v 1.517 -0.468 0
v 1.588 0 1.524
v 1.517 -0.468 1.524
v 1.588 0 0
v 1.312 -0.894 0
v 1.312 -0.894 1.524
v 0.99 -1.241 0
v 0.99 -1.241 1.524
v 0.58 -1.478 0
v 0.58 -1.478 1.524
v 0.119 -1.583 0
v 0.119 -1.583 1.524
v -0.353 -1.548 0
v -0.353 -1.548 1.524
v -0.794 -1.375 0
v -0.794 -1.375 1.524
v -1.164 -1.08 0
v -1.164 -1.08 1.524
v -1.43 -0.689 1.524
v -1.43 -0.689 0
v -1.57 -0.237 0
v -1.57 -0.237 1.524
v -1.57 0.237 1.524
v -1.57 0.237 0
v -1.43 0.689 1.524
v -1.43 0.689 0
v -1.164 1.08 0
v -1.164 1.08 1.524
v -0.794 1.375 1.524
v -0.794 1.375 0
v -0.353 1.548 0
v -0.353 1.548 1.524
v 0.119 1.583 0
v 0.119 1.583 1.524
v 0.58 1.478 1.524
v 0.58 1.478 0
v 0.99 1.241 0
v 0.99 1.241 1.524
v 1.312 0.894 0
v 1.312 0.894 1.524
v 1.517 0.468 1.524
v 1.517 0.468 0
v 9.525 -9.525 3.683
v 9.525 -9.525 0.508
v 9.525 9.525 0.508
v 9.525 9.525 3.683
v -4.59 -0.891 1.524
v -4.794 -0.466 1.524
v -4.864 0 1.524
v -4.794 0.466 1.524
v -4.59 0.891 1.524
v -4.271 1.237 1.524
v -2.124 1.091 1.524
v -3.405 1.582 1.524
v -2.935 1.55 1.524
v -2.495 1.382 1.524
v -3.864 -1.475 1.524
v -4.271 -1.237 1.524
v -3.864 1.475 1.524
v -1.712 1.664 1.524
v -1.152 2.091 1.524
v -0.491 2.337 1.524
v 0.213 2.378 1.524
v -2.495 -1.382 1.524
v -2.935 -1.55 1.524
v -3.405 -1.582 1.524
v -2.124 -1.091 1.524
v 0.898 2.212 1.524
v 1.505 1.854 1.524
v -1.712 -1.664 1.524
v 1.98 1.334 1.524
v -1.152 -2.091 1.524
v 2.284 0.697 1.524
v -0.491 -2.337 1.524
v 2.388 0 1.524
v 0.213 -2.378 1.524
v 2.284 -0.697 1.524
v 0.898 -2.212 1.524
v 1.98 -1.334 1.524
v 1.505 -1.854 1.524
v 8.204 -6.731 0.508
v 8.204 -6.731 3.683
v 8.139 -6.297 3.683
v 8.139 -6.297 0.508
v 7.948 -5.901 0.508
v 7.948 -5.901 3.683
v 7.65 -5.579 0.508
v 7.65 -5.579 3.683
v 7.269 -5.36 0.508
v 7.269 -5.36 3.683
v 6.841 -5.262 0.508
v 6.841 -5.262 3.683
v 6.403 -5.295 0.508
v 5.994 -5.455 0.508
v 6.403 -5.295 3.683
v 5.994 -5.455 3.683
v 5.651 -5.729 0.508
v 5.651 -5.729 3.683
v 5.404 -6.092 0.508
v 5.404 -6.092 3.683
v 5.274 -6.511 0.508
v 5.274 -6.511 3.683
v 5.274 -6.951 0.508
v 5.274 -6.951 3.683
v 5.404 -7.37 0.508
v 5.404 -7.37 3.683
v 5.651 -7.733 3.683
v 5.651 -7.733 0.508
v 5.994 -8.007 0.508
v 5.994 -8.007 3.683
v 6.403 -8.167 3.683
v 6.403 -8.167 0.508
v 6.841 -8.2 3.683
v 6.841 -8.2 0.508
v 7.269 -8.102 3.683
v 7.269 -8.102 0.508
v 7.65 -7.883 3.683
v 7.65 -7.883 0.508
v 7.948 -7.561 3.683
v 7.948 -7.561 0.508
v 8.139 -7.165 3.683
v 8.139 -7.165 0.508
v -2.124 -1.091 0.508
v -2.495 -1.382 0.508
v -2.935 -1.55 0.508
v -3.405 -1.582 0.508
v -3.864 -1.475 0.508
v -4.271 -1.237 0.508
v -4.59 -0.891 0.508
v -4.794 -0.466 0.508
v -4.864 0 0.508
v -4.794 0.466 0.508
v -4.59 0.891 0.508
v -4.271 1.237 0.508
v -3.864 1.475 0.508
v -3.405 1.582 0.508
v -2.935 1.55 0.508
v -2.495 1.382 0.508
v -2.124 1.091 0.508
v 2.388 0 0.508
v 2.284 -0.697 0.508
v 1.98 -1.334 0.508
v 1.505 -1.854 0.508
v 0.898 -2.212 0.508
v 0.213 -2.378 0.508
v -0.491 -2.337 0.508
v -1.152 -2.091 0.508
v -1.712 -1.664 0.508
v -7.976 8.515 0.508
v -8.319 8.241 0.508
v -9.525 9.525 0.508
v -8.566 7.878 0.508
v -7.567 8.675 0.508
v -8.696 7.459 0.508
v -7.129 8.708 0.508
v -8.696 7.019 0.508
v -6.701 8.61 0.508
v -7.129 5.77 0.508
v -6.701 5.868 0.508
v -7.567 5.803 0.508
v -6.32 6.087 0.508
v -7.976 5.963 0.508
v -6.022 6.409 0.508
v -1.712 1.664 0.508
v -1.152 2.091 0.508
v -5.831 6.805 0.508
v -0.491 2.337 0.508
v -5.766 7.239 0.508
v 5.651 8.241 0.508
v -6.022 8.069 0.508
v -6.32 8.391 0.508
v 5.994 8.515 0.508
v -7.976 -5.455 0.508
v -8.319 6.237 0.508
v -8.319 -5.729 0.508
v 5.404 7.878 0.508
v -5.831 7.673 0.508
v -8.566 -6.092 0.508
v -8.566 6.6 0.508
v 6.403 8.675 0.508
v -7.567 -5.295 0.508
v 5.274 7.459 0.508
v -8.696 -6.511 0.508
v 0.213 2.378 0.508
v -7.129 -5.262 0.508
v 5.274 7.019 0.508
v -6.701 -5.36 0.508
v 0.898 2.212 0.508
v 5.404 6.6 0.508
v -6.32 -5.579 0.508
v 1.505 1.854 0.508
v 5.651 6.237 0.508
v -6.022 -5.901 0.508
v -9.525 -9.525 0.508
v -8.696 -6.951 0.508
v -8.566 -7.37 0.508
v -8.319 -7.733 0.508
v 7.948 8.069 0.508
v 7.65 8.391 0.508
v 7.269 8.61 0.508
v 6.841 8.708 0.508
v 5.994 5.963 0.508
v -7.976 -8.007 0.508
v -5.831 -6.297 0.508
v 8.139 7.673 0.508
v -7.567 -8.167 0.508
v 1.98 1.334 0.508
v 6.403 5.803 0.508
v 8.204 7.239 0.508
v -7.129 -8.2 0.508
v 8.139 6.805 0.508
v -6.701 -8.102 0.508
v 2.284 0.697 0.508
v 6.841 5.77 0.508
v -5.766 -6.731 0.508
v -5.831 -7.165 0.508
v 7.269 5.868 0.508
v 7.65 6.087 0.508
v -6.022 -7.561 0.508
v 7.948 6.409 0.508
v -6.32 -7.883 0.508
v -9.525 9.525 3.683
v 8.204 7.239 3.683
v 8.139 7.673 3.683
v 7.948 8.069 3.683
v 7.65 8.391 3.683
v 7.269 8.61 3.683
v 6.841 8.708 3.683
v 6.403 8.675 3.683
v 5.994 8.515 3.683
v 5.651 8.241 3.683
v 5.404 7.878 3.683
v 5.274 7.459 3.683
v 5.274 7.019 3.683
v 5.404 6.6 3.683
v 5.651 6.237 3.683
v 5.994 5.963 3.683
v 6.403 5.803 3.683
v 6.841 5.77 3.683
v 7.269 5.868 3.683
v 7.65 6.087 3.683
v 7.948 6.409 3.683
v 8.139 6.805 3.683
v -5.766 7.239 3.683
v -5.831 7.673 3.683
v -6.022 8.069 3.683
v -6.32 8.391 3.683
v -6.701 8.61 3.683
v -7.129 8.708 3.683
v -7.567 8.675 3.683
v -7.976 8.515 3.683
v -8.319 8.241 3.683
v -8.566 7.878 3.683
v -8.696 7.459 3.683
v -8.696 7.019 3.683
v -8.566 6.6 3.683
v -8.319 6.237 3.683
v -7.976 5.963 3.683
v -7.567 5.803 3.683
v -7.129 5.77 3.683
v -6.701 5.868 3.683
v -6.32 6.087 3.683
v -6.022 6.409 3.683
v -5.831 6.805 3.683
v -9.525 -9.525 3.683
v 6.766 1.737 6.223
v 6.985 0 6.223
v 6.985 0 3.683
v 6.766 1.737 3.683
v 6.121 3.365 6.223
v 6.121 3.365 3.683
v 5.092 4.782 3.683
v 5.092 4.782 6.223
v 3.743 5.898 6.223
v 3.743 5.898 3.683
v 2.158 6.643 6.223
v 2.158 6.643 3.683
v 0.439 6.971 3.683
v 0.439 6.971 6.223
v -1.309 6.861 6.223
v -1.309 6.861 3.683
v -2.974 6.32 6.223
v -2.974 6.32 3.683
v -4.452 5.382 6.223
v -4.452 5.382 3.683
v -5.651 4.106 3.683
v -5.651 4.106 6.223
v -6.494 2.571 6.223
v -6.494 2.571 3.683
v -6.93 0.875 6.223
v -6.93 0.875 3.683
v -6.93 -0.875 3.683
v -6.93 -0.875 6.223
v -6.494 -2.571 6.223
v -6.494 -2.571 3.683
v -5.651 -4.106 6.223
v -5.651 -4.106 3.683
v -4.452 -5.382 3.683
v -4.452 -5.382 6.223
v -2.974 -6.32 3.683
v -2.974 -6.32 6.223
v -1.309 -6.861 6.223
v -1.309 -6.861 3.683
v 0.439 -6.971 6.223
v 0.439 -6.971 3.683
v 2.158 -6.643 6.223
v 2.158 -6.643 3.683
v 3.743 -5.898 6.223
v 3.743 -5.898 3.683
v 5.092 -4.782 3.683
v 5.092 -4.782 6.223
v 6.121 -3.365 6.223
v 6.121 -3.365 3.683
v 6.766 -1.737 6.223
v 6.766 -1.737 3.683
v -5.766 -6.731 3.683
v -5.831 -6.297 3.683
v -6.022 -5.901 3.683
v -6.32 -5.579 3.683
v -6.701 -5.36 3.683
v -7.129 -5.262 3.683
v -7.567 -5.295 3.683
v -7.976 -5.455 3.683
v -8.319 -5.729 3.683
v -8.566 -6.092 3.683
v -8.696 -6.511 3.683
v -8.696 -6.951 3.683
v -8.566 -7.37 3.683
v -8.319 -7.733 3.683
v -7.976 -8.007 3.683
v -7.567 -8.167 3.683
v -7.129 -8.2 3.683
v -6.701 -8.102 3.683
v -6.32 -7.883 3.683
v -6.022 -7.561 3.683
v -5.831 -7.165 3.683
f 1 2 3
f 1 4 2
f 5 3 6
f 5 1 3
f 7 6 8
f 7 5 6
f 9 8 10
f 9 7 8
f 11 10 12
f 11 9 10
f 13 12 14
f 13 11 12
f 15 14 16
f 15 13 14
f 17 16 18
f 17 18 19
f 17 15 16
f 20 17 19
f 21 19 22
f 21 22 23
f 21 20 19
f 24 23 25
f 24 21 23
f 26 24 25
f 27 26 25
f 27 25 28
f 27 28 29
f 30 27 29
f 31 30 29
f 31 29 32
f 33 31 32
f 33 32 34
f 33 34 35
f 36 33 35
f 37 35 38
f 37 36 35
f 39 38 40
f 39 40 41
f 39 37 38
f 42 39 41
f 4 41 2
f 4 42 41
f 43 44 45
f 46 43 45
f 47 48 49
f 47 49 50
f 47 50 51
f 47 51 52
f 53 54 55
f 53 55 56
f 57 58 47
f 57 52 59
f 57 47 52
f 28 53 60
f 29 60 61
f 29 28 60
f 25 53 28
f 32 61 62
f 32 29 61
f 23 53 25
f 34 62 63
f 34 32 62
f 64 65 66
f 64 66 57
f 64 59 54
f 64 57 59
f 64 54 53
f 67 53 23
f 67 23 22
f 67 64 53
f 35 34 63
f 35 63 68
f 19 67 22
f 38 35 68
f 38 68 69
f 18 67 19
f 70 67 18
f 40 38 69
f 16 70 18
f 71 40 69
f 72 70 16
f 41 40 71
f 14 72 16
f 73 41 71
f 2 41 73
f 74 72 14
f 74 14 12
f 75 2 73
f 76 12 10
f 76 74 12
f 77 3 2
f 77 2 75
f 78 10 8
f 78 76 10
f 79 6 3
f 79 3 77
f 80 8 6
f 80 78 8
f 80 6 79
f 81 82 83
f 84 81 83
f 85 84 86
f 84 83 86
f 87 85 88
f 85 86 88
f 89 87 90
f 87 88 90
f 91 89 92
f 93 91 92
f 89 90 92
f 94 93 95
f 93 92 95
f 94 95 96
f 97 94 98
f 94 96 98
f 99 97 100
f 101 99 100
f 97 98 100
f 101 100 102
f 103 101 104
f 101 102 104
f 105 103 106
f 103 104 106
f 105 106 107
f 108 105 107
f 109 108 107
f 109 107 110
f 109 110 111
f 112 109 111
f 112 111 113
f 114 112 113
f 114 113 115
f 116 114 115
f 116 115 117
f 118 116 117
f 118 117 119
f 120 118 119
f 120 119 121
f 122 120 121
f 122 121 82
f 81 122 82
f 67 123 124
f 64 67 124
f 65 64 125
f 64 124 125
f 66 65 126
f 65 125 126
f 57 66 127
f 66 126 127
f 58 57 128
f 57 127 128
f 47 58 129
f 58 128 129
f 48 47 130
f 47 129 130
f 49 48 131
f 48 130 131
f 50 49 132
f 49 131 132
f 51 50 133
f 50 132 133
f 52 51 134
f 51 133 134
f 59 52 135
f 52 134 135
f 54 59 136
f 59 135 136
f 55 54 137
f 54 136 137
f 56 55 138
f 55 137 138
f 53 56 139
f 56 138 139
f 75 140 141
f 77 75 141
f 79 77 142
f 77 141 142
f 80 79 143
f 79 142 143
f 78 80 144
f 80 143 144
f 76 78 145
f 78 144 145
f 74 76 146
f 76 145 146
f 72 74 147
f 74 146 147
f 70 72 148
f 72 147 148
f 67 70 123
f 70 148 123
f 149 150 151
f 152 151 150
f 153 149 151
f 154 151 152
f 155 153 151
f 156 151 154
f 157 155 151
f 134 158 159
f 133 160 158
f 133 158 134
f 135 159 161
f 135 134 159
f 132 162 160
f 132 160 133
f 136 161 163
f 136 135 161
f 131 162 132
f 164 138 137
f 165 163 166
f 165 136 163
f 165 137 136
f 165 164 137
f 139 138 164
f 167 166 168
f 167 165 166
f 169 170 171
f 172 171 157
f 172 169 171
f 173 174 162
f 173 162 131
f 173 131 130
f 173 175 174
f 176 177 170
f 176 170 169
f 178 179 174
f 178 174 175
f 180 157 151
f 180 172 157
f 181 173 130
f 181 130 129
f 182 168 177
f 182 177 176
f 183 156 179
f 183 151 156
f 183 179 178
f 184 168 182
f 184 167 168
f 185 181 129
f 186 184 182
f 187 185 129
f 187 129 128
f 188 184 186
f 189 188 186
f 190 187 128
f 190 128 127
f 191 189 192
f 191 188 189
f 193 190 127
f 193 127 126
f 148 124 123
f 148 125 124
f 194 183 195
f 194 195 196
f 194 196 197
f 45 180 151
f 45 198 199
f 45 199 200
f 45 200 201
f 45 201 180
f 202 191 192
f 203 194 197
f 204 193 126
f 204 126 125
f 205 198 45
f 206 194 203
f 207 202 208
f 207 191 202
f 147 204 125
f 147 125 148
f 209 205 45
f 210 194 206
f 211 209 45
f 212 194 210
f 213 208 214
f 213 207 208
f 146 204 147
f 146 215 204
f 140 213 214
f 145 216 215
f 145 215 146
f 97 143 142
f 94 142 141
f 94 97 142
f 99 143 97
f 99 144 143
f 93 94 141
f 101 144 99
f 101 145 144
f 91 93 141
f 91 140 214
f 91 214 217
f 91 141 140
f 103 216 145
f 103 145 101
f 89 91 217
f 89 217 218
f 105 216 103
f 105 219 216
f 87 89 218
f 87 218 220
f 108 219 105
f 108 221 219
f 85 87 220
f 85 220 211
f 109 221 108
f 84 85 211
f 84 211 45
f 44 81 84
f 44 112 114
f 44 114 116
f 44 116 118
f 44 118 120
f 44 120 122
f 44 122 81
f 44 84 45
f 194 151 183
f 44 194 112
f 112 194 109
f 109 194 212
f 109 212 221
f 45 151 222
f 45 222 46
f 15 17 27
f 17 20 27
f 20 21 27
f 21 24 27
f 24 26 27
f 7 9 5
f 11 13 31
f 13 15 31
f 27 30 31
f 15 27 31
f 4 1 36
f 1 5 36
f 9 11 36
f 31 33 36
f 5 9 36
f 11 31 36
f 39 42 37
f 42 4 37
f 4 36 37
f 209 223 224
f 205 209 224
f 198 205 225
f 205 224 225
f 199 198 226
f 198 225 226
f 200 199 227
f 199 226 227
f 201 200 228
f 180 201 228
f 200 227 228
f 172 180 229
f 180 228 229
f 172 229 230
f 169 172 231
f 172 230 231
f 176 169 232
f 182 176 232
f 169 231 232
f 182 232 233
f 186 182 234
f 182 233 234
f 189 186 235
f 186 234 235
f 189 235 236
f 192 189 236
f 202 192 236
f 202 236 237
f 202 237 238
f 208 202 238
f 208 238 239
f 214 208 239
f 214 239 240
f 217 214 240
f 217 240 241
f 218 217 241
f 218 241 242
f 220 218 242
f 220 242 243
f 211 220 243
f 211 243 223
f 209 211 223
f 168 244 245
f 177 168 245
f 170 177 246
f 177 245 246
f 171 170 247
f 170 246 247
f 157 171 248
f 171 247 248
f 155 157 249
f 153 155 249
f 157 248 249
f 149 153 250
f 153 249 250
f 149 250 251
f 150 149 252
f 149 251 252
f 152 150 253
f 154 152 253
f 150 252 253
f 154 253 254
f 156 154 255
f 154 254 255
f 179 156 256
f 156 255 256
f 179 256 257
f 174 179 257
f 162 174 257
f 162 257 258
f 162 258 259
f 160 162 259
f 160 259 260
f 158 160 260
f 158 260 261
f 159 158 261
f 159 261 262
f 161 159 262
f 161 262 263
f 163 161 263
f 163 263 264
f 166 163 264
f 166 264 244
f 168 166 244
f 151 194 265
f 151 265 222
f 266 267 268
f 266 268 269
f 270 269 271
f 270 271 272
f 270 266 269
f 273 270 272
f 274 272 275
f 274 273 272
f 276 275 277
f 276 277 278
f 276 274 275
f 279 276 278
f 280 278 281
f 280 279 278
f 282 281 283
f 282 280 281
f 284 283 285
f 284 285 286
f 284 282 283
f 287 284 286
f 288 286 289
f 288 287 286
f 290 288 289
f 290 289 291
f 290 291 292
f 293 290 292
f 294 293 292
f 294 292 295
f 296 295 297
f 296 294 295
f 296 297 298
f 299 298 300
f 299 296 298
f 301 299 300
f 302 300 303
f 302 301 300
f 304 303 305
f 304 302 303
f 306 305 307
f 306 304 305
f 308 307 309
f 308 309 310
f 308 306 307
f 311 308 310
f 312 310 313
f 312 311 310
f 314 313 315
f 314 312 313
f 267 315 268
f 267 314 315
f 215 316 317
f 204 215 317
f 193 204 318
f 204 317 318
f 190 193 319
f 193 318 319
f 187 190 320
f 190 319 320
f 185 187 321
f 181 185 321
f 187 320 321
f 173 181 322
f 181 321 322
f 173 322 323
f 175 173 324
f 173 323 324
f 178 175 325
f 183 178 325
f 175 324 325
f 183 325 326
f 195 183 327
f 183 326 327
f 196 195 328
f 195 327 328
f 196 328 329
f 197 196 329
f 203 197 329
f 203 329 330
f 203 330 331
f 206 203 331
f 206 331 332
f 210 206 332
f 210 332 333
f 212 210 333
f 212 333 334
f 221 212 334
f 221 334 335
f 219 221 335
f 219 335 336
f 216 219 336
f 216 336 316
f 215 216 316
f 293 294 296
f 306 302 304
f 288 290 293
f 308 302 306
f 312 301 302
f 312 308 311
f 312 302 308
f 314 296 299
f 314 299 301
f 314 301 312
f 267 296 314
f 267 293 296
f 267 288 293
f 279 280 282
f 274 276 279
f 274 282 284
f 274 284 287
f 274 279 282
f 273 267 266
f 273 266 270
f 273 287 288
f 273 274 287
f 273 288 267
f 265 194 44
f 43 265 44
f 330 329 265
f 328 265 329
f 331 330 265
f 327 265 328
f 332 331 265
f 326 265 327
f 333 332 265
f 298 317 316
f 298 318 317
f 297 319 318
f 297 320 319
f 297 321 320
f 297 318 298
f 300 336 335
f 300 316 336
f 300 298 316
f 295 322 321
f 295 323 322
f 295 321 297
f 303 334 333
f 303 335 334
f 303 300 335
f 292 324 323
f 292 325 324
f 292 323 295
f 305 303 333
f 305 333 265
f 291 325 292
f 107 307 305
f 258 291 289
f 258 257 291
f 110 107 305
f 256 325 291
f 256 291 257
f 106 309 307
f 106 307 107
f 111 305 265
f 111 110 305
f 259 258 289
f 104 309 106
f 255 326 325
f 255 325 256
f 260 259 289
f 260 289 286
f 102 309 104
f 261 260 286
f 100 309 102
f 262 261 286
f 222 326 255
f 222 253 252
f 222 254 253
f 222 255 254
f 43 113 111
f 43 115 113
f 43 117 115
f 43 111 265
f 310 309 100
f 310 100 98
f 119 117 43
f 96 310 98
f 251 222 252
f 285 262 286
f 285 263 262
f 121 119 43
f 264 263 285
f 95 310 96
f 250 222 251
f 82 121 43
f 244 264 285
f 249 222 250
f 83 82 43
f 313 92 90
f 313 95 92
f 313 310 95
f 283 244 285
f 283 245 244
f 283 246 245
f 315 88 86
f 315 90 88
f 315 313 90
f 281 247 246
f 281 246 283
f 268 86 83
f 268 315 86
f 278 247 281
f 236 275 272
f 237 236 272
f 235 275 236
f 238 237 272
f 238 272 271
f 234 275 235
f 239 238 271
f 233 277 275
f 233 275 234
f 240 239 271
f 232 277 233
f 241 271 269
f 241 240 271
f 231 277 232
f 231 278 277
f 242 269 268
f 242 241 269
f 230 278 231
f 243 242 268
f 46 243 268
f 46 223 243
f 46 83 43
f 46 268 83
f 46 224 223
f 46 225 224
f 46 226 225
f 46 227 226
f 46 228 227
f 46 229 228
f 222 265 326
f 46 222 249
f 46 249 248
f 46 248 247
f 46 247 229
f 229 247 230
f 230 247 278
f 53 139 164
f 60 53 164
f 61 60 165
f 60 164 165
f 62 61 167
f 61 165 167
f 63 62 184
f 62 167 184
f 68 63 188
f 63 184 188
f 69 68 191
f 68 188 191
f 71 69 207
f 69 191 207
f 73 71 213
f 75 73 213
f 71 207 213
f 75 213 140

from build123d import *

# Parameters (mm, degrees)
F0_W     = 19.05
F0_H     = 19.05
F1_DEPTH = 6.223
F2_W     = 19.05
F2_H     = 19.05
F2_R     = 6.985
F3_DEPTH = 2.54
F4_R     = 1.4732
F5_DEPTH = 3.684
F6_W     = 19.05
F6_H     = 19.05
F6_R     = 1.5875
F7_DEPTH = 0.508
F8_R     = 1.5875
F9_DEPTH = 1.016


with BuildPart() as f1:
    # F0 (on Top) → F1 (new body)
    with BuildSketch(Plane.XY):
        Rectangle(F0_W, F0_H)
    extrude(amount=F1_DEPTH)

    # F2 (on face) → F3 (cut)
    with BuildSketch(Plane.XY.offset(6.223)):
        Rectangle(F2_W, F2_H)
        Circle(F2_R, mode=Mode.SUBTRACT)
    extrude(amount=-F3_DEPTH, mode=Mode.SUBTRACT)

    # F4 (on face) → F5 (cut, through all)
    with BuildSketch(Plane.XY.offset(3.683)):
        with Locations((-7.239, 7.239)):
            Circle(F4_R)
        with Locations((-7.239, -6.731)):
            Circle(F4_R)
        with Locations((6.731, 7.239)):
            Circle(F4_R)
        with Locations((6.731, -6.731)):
            Circle(F4_R)
    extrude(amount=-F5_DEPTH, mode=Mode.SUBTRACT)

    # F6 (on face) → F7 (cut)
    with BuildSketch(Plane(origin=(0, 0, 0), x_dir=(1, 0, 0), z_dir=(0, 0, -1))):
        Rectangle(F6_W, F6_H)
        Circle(F6_R, mode=Mode.SUBTRACT)
    extrude(amount=-F7_DEPTH, mode=Mode.SUBTRACT)

    # F8 (on face) → F9 (cut)
    with BuildSketch(Plane(origin=(0, 0, 0.508), x_dir=(1, 0, 0), z_dir=(0, 0, -1))):
        with BuildLine():
            ThreePointArc((-2.1236319767, -1.0912474455), (-1.8017283129, -0.5872901809), (-1.6891, 0))
            ThreePointArc((-1.6891, 0), (-1.8017283129, 0.5872901809), (-2.1236319767, 1.0912474455))
            ThreePointArc((-2.1236319767, 1.0912474455), (-2.3876, 0), (-2.1236319767, -1.0912474455))
        make_face()
        with BuildLine():
            ThreePointArc((-2.1236319767, 1.0912474455), (-1.8017283129, 0.5872901809), (-1.6891, 0))
            ThreePointArc((-1.6891, 0), (-1.8017283129, -0.5872901809), (-2.1236319767, -1.0912474455))
            ThreePointArc((-2.1236319767, -1.0912474455), (0.5613599791, -2.320669889), (2.3876, 0))
            ThreePointArc((2.3876, 0), (0.5613599791, 2.320669889), (-2.1236319767, 1.0912474455))
        make_face()
        Circle(F8_R, mode=Mode.SUBTRACT)
        with BuildLine():
            ThreePointArc((-2.1236319767, -1.0912474455), (-2.3876, 0), (-2.1236319767, 1.0912474455))
            ThreePointArc((-2.1236319767, 1.0912474455), (-4.8641, 0), (-2.1236319767, -1.0912474455))
        make_face()
    extrude(amount=-F9_DEPTH, mode=Mode.SUBTRACT)


solid = f1.part
